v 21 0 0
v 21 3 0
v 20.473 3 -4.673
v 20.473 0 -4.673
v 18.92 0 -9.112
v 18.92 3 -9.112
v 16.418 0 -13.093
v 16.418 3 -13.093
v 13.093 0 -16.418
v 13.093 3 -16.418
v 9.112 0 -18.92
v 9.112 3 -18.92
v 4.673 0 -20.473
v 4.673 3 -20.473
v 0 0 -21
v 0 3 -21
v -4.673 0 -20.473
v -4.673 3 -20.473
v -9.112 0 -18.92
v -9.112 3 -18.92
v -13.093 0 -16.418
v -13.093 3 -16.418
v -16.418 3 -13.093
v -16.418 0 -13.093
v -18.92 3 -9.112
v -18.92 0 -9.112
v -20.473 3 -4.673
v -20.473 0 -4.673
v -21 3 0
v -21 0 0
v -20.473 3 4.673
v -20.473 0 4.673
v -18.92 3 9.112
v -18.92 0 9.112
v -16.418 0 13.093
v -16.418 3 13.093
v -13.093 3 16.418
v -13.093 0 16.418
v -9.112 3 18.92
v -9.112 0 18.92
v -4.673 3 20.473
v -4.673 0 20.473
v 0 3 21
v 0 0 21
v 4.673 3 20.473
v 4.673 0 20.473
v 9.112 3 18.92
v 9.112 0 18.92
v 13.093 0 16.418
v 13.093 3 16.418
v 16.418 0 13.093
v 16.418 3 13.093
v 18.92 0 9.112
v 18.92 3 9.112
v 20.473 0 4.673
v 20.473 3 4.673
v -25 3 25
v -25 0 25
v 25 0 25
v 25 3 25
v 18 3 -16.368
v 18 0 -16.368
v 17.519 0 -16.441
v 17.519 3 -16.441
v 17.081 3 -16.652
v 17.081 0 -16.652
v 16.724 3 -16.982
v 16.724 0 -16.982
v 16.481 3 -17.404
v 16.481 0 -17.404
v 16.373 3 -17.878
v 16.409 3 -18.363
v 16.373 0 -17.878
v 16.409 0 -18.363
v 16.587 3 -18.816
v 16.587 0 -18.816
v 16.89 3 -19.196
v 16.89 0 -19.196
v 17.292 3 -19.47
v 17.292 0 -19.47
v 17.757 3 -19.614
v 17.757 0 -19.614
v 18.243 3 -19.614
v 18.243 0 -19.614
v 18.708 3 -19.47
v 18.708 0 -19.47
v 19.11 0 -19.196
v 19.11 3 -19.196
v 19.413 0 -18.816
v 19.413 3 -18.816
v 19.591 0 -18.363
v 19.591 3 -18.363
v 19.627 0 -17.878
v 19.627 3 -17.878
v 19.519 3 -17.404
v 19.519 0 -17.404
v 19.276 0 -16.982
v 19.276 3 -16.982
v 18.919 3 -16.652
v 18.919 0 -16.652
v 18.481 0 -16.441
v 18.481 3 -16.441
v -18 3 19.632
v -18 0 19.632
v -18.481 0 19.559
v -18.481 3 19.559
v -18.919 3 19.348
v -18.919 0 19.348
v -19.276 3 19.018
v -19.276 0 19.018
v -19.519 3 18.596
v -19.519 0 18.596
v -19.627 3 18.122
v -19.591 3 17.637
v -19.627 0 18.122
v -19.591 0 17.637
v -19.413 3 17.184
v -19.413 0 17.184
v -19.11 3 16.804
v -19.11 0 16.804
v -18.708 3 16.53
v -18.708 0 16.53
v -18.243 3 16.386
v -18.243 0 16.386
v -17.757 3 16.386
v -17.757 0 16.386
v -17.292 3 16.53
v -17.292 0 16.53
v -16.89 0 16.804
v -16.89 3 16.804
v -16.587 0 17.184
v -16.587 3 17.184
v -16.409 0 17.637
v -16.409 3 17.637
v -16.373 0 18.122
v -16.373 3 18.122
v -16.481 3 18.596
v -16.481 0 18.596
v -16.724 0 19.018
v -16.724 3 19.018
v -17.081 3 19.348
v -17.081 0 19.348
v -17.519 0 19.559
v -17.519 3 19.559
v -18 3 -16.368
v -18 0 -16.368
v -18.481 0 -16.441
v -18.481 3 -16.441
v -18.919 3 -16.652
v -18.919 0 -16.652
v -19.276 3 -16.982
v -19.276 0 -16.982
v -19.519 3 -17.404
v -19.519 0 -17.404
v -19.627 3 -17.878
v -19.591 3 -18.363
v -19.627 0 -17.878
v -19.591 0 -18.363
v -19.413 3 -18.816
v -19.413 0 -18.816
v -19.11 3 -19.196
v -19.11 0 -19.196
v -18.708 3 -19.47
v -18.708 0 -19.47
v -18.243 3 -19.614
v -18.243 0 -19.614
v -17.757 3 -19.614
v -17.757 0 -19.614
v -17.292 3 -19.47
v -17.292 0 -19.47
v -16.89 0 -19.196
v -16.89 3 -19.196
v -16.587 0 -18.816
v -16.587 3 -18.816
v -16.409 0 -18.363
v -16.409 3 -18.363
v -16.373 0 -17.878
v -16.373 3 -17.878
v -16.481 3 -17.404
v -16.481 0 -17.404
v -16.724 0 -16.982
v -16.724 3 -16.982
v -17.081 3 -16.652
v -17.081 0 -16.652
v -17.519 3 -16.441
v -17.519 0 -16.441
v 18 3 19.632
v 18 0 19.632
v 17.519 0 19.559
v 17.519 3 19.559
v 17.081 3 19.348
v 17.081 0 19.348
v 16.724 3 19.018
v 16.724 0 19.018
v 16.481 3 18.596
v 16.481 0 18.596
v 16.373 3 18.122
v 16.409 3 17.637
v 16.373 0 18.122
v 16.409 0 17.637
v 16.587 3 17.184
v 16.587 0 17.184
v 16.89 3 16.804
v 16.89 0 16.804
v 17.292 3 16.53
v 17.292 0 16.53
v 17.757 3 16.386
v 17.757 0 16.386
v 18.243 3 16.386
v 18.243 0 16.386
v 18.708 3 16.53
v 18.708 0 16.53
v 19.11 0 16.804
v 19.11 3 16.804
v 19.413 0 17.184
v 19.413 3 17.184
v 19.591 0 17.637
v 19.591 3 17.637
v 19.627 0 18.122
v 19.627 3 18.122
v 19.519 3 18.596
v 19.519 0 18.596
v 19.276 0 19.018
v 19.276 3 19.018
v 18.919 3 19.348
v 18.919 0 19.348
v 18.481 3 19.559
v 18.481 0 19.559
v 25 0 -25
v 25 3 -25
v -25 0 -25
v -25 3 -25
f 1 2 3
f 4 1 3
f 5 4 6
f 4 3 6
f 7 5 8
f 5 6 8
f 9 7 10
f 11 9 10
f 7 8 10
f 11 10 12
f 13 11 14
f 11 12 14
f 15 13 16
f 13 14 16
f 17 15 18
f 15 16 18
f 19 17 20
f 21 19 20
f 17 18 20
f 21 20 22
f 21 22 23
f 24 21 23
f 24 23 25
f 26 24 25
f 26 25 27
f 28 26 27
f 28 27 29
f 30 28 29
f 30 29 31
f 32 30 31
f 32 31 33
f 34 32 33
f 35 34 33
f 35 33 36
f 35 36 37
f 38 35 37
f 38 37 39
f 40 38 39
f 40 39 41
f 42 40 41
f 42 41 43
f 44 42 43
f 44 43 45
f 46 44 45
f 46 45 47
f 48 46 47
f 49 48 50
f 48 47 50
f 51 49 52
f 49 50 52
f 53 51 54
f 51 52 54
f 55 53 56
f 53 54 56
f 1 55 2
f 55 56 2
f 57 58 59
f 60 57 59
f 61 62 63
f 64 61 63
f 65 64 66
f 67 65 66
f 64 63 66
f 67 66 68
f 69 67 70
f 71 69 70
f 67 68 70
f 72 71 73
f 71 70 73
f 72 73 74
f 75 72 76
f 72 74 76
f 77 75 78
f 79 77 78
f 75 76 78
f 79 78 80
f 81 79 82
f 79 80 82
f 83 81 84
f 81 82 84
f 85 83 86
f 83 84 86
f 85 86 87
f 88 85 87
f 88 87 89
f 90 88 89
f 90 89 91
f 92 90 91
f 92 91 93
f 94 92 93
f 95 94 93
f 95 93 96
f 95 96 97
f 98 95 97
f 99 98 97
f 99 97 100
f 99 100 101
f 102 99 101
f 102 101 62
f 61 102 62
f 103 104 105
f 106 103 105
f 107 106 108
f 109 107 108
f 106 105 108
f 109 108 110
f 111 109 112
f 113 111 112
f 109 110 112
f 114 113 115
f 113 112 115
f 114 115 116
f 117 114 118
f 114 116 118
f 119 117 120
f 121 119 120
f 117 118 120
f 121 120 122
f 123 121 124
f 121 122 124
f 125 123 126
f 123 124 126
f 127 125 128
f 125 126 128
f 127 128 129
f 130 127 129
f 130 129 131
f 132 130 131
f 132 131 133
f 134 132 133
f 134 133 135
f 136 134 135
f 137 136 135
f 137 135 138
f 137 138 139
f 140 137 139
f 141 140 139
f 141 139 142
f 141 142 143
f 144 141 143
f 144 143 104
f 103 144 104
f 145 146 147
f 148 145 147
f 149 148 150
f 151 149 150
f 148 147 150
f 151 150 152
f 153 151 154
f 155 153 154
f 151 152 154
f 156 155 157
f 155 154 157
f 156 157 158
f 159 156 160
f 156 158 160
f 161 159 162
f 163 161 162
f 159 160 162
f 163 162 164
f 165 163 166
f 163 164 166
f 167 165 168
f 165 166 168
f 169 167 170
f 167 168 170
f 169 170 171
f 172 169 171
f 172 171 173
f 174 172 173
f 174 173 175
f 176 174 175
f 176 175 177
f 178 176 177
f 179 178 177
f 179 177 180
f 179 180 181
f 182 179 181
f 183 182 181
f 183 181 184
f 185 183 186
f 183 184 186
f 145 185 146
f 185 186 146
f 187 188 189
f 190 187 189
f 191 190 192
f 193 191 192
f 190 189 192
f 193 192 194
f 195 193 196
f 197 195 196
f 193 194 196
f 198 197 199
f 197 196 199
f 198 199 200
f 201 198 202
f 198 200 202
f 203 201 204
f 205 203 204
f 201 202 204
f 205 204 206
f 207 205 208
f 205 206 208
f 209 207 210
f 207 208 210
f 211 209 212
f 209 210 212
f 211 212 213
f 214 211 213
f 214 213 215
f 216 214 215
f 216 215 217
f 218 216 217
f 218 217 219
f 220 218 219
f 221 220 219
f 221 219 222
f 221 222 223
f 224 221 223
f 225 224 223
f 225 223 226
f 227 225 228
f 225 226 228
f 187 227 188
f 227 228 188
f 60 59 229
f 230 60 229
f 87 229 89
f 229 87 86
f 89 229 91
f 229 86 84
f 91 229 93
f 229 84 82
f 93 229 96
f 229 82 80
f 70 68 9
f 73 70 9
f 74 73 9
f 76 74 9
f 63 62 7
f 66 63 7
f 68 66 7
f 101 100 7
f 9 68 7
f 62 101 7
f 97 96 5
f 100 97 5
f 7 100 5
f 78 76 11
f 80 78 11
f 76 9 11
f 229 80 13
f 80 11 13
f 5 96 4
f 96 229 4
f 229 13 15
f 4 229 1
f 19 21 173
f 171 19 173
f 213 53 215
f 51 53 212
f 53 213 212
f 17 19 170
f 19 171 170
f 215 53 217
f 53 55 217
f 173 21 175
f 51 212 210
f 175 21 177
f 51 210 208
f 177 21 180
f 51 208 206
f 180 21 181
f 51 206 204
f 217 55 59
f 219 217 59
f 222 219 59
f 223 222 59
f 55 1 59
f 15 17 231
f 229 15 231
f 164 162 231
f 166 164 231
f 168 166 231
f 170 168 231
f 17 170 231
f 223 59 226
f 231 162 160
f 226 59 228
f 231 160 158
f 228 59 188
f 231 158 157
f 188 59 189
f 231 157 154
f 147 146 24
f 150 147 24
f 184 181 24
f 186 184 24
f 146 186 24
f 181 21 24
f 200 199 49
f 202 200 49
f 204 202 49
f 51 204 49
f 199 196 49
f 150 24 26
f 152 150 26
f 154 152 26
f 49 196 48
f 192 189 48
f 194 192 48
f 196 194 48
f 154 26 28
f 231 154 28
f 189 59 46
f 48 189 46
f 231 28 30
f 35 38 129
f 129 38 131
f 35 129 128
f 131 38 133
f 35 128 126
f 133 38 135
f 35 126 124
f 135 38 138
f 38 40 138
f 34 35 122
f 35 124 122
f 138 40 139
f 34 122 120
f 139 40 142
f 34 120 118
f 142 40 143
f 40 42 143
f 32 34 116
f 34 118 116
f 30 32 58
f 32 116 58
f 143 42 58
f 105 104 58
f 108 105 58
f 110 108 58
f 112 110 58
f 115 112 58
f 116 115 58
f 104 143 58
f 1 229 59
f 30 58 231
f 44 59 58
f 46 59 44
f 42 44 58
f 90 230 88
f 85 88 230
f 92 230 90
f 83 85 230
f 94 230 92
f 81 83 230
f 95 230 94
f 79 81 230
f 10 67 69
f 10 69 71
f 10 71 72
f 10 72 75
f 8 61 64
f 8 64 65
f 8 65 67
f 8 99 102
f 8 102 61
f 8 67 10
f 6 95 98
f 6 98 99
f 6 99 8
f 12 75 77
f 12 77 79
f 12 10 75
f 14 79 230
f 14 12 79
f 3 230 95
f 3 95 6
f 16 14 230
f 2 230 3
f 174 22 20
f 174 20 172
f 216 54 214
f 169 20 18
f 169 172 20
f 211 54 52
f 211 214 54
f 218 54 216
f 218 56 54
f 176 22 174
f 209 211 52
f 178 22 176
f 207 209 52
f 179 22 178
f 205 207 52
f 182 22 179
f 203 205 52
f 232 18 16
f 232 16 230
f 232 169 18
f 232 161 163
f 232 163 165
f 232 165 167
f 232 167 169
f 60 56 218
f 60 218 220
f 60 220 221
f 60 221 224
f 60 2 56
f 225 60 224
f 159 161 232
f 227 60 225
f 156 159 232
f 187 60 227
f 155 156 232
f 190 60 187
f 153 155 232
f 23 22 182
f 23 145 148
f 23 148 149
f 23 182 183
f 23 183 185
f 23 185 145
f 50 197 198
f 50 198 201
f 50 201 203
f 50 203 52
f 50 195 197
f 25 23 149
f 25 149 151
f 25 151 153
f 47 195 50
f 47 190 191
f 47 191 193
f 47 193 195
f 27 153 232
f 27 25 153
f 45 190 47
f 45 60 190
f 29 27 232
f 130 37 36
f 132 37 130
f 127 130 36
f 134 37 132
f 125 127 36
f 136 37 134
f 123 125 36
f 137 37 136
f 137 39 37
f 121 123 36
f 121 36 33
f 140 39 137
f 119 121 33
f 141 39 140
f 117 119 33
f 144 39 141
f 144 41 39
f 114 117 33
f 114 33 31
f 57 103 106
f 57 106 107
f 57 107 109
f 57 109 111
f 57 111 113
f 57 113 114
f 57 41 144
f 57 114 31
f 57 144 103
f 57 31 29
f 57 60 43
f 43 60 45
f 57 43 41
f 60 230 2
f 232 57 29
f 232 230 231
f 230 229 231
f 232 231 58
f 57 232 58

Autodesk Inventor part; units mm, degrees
ref_plane "YZ Plane" through (0, 0, 0) normal (1, 0, 0) x (0, 1, 0)
ref_plane "XZ Plane" through (0, 0, 0) normal (0, 1, 0) x (-1, 0, 0)
ref_plane "XY Plane" through (0, 0, 0) normal (0, 0, 1) x (1, 0, 0)
sketch "Sketch7" plane through (0, 0, 0) normal (0, 1, 0) x (-1, 0, 0)
  line L0 (-25, -25) -> (25, -25)
  line L1 (25, -25) -> (25, 25)
  line L2 (25, 25) -> (-25, 25)
  line L3 (-25, 25) -> (-25, -25)
  line L4 (-25, -25) -> (25, 25) construction
  line L5 (25, -25) -> (-25, 25) construction
  point P0 (0, 0)
  point P1 (0, 0)
  dimension "d54" = 50
  dimension "d55" = 50
extrude "Extrusion4" add sketch "Sketch7" along normal blind 3
sketch "Sketch8" plane through (0, 3, 0) normal (0, 1, 0) x (1, 0, 0)
  circle A0 centre (0, 0) radius 21
  dimension "d58" = 42
extrude "Extrusion5" cut sketch "Sketch8" against normal blind 3
sketch "Sketch10" plane through (0, 3, 0) normal (0, 1, 0) x (1, 0, 0)
  line L0 (-18, -18) -> (18, -18)
  line L1 (18, -18) -> (18, 18)
  line L2 (18, 18) -> (-18, 18)
  line L3 (-18, 18) -> (-18, -18)
  line L4 (-18, -18) -> (18, 18) construction
  line L5 (18, -18) -> (-18, 18) construction
  point P0 (0, 0)
  dimension "d62" = 36
  dimension "d63" = 36
hole "Hole2" at (-18, 3, 18) at (-18, 3, -18) at (18, 3, -18) at (18, 3, 18) direction (0, -1, 0) diameter 3.264 end through all clearance for "Flat Head Machine Screw (82)" size "#4" standard "Ansi Unified Screw Threads"
properties part number "chamberPlateNA11_thin"
